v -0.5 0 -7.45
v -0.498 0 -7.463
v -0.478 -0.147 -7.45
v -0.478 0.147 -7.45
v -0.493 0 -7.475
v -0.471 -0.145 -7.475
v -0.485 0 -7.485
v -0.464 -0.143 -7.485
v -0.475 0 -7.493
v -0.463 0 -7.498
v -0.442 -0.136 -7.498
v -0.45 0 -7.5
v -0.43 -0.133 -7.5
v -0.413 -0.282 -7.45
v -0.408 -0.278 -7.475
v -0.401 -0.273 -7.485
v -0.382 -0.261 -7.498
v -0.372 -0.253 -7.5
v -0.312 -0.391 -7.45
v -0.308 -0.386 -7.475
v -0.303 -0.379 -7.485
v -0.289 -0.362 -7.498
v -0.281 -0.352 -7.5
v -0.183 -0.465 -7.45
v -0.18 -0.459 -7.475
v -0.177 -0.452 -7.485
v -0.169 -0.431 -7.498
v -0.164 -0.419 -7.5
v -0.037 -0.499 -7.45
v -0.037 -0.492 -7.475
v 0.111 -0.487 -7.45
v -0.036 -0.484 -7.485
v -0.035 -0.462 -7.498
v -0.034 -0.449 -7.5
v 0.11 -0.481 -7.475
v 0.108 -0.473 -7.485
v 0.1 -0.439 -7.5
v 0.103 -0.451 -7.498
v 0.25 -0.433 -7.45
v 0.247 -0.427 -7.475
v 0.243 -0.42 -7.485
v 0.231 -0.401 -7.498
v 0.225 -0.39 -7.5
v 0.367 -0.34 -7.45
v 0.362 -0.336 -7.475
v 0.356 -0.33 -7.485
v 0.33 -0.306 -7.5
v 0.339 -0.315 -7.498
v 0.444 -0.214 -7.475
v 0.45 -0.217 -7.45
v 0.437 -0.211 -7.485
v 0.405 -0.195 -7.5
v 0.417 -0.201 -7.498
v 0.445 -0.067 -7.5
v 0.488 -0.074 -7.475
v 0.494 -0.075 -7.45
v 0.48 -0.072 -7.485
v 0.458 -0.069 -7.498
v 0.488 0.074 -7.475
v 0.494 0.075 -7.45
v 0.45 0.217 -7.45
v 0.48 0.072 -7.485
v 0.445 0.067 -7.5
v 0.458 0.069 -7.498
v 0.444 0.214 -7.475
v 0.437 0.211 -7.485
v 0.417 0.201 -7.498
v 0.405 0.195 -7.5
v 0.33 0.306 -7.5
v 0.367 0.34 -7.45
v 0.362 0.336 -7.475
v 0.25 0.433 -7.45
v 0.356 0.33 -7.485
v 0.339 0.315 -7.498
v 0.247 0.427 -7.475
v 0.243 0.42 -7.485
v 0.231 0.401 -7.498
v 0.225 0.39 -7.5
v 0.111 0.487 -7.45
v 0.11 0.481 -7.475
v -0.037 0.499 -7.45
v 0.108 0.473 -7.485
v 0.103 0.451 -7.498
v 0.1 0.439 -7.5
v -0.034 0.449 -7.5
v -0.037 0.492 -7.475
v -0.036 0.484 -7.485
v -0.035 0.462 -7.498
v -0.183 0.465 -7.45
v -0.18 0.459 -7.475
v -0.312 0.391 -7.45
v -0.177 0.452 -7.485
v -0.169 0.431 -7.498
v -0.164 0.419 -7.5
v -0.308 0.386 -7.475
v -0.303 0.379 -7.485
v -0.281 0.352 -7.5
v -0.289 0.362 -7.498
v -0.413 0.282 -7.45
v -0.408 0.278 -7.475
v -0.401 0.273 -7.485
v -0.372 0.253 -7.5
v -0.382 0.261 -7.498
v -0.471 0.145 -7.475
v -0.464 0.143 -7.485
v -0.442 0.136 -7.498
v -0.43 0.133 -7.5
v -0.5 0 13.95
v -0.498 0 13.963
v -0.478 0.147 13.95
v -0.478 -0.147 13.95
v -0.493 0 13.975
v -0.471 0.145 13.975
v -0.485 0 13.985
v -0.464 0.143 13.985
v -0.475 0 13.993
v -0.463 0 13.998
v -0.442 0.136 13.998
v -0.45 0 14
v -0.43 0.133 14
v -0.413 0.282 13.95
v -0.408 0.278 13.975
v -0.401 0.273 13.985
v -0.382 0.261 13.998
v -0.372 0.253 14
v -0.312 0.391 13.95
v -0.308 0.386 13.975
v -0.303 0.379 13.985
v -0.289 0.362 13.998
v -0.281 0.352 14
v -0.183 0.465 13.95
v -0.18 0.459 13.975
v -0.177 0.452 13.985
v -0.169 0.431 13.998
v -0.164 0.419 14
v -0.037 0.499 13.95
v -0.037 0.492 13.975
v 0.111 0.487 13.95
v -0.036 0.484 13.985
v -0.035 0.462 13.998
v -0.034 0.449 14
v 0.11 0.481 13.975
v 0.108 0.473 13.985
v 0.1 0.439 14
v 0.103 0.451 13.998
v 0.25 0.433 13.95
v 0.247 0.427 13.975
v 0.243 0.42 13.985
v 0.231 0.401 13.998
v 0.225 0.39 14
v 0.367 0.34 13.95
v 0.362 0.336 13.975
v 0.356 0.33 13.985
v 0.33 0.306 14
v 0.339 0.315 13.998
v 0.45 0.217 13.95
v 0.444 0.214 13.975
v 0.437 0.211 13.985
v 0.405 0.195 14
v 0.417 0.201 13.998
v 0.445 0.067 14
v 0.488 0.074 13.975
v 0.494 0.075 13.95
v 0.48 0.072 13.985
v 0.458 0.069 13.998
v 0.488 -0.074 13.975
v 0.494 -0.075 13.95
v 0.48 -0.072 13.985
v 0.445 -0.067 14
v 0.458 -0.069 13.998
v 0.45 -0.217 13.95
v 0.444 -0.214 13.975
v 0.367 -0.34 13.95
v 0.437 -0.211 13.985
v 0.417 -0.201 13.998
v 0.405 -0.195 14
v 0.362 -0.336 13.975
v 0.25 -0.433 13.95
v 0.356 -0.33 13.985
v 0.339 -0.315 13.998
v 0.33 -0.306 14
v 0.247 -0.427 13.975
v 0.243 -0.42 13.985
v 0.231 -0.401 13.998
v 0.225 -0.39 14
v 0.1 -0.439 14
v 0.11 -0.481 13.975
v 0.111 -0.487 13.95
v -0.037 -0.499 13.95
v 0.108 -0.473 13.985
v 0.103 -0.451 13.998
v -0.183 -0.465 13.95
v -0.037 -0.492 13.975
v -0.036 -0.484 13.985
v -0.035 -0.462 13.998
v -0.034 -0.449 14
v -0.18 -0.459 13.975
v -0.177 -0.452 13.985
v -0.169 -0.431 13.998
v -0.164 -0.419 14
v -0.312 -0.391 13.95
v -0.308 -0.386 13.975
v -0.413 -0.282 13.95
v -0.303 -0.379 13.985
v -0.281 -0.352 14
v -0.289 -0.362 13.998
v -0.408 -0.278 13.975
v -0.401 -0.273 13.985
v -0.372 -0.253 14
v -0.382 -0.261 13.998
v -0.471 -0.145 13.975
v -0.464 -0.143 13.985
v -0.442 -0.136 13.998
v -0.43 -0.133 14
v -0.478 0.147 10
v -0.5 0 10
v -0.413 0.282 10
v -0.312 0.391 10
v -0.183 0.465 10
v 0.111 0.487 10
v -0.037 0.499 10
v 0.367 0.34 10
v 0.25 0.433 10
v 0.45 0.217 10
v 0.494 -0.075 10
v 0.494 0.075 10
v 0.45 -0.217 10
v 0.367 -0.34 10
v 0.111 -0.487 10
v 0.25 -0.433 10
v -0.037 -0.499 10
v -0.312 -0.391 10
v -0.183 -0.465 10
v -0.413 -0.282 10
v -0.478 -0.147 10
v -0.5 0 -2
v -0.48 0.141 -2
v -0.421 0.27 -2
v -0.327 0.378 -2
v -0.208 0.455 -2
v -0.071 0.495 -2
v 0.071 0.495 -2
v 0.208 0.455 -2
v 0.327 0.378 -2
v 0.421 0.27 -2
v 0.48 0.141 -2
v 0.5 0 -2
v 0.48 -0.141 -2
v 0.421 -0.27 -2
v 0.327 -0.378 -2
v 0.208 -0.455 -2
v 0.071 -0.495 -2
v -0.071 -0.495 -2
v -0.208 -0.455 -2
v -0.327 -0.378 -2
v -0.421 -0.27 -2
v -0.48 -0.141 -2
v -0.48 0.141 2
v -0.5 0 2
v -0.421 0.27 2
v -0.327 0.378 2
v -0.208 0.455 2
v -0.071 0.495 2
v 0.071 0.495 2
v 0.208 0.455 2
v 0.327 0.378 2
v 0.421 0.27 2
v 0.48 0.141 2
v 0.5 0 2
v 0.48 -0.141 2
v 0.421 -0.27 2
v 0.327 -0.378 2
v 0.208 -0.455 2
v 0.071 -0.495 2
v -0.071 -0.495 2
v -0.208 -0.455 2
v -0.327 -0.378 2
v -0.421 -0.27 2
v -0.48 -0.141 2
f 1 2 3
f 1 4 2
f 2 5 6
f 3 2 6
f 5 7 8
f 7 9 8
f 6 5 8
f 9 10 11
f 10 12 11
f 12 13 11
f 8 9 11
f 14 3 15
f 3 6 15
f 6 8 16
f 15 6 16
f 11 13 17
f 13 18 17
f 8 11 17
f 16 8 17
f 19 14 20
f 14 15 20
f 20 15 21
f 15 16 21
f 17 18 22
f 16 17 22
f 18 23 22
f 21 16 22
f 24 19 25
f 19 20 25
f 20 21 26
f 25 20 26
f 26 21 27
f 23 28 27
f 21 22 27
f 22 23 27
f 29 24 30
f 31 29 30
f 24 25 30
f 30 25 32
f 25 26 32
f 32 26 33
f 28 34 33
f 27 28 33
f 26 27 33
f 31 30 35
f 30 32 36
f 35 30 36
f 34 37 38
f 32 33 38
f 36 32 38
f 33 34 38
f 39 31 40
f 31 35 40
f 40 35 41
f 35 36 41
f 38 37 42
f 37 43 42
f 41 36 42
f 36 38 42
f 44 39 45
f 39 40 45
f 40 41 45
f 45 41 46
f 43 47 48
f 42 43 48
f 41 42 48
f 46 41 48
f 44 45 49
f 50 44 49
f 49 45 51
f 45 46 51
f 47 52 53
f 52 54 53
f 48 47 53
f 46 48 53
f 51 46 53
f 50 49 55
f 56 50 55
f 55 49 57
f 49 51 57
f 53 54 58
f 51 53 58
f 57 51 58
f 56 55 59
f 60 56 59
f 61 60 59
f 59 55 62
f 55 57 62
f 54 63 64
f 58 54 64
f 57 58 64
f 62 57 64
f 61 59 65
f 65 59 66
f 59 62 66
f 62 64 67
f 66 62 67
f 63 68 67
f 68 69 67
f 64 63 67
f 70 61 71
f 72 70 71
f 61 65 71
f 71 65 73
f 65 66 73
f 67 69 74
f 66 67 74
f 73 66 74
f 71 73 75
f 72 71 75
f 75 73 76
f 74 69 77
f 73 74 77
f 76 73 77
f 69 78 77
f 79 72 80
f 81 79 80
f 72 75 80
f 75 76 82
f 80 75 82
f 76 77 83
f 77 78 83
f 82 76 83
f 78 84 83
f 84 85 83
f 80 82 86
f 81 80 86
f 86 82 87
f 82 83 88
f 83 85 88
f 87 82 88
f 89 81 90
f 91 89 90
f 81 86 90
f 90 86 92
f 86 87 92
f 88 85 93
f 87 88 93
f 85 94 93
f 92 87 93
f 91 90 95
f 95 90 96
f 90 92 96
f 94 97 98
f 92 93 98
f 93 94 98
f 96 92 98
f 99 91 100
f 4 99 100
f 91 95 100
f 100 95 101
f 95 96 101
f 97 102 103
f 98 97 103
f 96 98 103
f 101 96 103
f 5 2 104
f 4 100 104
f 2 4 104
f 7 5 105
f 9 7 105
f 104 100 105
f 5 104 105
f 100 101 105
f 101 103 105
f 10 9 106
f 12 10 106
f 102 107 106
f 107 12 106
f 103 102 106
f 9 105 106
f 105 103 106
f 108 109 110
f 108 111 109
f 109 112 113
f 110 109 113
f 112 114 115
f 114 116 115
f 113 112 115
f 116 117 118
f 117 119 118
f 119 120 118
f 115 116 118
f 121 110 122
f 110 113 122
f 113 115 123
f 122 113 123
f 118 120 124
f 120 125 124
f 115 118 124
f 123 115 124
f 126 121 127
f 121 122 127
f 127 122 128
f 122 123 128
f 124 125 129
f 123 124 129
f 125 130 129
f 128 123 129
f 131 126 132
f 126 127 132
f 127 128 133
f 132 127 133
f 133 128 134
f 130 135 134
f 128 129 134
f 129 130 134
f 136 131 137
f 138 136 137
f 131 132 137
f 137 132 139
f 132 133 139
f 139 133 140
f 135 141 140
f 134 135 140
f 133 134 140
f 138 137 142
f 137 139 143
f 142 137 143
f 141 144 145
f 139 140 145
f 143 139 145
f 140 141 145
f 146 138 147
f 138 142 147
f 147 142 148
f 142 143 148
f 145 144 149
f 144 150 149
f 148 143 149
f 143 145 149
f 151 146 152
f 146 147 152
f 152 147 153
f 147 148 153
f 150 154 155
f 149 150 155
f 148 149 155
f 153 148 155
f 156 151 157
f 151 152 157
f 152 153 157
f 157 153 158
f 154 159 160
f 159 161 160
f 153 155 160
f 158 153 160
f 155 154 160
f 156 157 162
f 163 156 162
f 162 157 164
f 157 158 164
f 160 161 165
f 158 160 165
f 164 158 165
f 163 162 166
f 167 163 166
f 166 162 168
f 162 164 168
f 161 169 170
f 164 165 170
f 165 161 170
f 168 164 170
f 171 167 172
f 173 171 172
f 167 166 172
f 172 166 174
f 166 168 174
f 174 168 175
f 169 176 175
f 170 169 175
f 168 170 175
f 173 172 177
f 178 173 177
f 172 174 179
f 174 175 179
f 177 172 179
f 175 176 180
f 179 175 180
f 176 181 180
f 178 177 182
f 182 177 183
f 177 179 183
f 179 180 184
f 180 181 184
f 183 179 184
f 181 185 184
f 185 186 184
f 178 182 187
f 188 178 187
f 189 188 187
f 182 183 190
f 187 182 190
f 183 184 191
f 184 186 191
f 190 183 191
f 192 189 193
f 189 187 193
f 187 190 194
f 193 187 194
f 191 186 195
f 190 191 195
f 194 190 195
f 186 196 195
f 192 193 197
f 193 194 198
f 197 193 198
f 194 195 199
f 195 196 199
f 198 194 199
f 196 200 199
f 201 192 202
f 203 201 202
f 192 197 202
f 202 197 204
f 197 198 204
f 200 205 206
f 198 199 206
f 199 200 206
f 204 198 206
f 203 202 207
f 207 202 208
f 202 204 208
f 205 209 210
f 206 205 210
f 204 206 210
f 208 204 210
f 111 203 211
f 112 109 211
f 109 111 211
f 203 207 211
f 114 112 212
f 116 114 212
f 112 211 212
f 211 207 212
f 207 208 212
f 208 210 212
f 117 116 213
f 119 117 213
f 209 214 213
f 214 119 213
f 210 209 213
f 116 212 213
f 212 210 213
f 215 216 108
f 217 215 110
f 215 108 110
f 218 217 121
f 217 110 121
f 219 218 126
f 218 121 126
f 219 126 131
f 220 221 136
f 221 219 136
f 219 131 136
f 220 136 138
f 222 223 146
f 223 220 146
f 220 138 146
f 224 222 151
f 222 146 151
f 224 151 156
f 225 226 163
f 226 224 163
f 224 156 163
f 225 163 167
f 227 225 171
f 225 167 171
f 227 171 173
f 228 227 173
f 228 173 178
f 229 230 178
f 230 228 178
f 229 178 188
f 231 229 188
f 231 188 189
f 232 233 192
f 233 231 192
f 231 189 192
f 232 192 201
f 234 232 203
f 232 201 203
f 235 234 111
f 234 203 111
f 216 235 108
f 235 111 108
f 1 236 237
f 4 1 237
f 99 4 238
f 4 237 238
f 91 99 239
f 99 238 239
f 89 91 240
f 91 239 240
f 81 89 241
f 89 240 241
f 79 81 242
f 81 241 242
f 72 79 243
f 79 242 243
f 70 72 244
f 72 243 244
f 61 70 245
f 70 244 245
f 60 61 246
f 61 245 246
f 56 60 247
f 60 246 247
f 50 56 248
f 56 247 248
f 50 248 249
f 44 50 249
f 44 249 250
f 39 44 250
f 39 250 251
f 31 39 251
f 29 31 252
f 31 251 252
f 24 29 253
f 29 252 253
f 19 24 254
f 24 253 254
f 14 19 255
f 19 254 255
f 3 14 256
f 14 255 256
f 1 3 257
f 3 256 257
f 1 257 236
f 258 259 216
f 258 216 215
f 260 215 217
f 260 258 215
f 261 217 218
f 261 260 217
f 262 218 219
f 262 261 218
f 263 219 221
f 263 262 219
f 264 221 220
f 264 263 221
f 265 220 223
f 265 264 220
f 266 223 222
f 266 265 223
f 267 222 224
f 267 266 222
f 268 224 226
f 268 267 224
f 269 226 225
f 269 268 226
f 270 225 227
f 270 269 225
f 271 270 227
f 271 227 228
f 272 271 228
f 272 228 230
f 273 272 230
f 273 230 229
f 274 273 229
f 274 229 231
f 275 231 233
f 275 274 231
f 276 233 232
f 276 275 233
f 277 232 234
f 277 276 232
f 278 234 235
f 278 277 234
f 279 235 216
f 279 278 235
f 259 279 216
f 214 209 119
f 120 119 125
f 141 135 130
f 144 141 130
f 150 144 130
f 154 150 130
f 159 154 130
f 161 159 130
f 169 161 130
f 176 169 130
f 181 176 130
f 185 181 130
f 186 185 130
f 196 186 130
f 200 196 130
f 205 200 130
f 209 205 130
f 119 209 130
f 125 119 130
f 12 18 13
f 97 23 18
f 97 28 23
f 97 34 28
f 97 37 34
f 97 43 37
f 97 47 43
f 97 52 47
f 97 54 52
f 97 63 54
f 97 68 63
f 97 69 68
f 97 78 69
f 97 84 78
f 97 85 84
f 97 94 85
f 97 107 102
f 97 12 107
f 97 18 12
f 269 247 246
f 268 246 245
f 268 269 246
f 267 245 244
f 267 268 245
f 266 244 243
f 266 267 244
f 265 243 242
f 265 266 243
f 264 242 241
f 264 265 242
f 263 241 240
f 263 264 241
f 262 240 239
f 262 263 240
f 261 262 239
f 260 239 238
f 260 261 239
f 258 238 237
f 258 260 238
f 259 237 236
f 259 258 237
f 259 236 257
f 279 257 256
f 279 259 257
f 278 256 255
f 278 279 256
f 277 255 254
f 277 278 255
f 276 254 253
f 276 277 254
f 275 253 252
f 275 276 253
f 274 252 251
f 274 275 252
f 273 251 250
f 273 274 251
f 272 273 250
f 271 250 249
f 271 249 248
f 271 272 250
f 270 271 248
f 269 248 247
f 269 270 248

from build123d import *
from build123d.topology import SkipClean

# Parameters (mm, degrees)
SKETCH1_R                = 0.5
BOSS_EXTRUDE1_DEPTH      = 2
SKETCH2_R                = 0.75
BOSS_EXTRUDE2_DEPTH      = 8
BOSS_EXTRUDE3_START      = 8
SKETCH3_R                = 0.75
BOSS_EXTRUDE3_DEPTH      = 8
BOSS_EXTRUDE4_DEPTH      = 2
BOSS_EXTRUDE4_DEPTH_BACK = 24
SKETCH4_R                = 0.5
SKETCH5_R                = 1.083179326
SKETCH5_R_2              = 0.5
CUT_EXTRUDE1_DEPTH       = 20
SKETCH6_R                = 0.993083776
CUT_EXTRUDE2_DEPTH       = 4.5
FILLET1_R                = 0.05


with BuildPart() as part:
    # Sketch1 → Boss-Extrude1 (new, symmetric)
    with BuildSketch(Plane.XY):
        Circle(SKETCH1_R)
    extrude(amount=BOSS_EXTRUDE1_DEPTH, both=True)

    # Sketch2 → Boss-Extrude2 (add)
    with BuildSketch(Plane.XY.offset(2)):
        Circle(SKETCH2_R)
    extrude(amount=BOSS_EXTRUDE2_DEPTH)

    # Sketch3 → Boss-Extrude3 (add)
    with BuildSketch(Plane(origin=(0, 0, -2), x_dir=(-1, 0, 0), z_dir=(0, 0, -1)).offset(BOSS_EXTRUDE3_START)):
        Circle(SKETCH3_R)
    extrude(amount=-BOSS_EXTRUDE3_DEPTH)

    # Sketch4 → Boss-Extrude4 (add, two sides: drawn at the far end of the back side and taken through both)
    with BuildSketch(Plane(origin=(0, 0, -10), x_dir=(-1, 0, 0), z_dir=(0, 0, -1)).offset(-BOSS_EXTRUDE4_DEPTH_BACK)):
        Circle(SKETCH4_R)
    extrude(amount=BOSS_EXTRUDE4_DEPTH + BOSS_EXTRUDE4_DEPTH_BACK)

    # Sketch5 → Cut-Extrude1 (cut, symmetric)
    with SkipClean():  # the faces are left unmerged after this step: merging them gives an invalid solid
        with BuildSketch(Plane(origin=(0, 0, 2), x_dir=(-1, 0, 0), z_dir=(0, 0, -1))):
            Circle(SKETCH5_R)
            Circle(SKETCH5_R_2, mode=Mode.SUBTRACT)
        extrude(amount=CUT_EXTRUDE1_DEPTH, both=True, mode=Mode.SUBTRACT)
    add(part.part.scale(1), mode=Mode.REPLACE)  # the faces are merged on a copy

    # Sketch6 → Cut-Extrude2 (cut)
    with BuildSketch(Plane(origin=(0, 0, -12), x_dir=(-1, 0, 0), z_dir=(0, 0, -1))):
        Circle(SKETCH6_R)
    extrude(amount=-CUT_EXTRUDE2_DEPTH, mode=Mode.SUBTRACT)

    # Fillet1
    fillet1_edges = [part.edges().sort_by_distance(p)[0] for p in [
        (0.5, 0, 14),
        (0.5, 0, -7.5),
    ]]
    fillet(fillet1_edges, radius=FILLET1_R)


solid = part.part
